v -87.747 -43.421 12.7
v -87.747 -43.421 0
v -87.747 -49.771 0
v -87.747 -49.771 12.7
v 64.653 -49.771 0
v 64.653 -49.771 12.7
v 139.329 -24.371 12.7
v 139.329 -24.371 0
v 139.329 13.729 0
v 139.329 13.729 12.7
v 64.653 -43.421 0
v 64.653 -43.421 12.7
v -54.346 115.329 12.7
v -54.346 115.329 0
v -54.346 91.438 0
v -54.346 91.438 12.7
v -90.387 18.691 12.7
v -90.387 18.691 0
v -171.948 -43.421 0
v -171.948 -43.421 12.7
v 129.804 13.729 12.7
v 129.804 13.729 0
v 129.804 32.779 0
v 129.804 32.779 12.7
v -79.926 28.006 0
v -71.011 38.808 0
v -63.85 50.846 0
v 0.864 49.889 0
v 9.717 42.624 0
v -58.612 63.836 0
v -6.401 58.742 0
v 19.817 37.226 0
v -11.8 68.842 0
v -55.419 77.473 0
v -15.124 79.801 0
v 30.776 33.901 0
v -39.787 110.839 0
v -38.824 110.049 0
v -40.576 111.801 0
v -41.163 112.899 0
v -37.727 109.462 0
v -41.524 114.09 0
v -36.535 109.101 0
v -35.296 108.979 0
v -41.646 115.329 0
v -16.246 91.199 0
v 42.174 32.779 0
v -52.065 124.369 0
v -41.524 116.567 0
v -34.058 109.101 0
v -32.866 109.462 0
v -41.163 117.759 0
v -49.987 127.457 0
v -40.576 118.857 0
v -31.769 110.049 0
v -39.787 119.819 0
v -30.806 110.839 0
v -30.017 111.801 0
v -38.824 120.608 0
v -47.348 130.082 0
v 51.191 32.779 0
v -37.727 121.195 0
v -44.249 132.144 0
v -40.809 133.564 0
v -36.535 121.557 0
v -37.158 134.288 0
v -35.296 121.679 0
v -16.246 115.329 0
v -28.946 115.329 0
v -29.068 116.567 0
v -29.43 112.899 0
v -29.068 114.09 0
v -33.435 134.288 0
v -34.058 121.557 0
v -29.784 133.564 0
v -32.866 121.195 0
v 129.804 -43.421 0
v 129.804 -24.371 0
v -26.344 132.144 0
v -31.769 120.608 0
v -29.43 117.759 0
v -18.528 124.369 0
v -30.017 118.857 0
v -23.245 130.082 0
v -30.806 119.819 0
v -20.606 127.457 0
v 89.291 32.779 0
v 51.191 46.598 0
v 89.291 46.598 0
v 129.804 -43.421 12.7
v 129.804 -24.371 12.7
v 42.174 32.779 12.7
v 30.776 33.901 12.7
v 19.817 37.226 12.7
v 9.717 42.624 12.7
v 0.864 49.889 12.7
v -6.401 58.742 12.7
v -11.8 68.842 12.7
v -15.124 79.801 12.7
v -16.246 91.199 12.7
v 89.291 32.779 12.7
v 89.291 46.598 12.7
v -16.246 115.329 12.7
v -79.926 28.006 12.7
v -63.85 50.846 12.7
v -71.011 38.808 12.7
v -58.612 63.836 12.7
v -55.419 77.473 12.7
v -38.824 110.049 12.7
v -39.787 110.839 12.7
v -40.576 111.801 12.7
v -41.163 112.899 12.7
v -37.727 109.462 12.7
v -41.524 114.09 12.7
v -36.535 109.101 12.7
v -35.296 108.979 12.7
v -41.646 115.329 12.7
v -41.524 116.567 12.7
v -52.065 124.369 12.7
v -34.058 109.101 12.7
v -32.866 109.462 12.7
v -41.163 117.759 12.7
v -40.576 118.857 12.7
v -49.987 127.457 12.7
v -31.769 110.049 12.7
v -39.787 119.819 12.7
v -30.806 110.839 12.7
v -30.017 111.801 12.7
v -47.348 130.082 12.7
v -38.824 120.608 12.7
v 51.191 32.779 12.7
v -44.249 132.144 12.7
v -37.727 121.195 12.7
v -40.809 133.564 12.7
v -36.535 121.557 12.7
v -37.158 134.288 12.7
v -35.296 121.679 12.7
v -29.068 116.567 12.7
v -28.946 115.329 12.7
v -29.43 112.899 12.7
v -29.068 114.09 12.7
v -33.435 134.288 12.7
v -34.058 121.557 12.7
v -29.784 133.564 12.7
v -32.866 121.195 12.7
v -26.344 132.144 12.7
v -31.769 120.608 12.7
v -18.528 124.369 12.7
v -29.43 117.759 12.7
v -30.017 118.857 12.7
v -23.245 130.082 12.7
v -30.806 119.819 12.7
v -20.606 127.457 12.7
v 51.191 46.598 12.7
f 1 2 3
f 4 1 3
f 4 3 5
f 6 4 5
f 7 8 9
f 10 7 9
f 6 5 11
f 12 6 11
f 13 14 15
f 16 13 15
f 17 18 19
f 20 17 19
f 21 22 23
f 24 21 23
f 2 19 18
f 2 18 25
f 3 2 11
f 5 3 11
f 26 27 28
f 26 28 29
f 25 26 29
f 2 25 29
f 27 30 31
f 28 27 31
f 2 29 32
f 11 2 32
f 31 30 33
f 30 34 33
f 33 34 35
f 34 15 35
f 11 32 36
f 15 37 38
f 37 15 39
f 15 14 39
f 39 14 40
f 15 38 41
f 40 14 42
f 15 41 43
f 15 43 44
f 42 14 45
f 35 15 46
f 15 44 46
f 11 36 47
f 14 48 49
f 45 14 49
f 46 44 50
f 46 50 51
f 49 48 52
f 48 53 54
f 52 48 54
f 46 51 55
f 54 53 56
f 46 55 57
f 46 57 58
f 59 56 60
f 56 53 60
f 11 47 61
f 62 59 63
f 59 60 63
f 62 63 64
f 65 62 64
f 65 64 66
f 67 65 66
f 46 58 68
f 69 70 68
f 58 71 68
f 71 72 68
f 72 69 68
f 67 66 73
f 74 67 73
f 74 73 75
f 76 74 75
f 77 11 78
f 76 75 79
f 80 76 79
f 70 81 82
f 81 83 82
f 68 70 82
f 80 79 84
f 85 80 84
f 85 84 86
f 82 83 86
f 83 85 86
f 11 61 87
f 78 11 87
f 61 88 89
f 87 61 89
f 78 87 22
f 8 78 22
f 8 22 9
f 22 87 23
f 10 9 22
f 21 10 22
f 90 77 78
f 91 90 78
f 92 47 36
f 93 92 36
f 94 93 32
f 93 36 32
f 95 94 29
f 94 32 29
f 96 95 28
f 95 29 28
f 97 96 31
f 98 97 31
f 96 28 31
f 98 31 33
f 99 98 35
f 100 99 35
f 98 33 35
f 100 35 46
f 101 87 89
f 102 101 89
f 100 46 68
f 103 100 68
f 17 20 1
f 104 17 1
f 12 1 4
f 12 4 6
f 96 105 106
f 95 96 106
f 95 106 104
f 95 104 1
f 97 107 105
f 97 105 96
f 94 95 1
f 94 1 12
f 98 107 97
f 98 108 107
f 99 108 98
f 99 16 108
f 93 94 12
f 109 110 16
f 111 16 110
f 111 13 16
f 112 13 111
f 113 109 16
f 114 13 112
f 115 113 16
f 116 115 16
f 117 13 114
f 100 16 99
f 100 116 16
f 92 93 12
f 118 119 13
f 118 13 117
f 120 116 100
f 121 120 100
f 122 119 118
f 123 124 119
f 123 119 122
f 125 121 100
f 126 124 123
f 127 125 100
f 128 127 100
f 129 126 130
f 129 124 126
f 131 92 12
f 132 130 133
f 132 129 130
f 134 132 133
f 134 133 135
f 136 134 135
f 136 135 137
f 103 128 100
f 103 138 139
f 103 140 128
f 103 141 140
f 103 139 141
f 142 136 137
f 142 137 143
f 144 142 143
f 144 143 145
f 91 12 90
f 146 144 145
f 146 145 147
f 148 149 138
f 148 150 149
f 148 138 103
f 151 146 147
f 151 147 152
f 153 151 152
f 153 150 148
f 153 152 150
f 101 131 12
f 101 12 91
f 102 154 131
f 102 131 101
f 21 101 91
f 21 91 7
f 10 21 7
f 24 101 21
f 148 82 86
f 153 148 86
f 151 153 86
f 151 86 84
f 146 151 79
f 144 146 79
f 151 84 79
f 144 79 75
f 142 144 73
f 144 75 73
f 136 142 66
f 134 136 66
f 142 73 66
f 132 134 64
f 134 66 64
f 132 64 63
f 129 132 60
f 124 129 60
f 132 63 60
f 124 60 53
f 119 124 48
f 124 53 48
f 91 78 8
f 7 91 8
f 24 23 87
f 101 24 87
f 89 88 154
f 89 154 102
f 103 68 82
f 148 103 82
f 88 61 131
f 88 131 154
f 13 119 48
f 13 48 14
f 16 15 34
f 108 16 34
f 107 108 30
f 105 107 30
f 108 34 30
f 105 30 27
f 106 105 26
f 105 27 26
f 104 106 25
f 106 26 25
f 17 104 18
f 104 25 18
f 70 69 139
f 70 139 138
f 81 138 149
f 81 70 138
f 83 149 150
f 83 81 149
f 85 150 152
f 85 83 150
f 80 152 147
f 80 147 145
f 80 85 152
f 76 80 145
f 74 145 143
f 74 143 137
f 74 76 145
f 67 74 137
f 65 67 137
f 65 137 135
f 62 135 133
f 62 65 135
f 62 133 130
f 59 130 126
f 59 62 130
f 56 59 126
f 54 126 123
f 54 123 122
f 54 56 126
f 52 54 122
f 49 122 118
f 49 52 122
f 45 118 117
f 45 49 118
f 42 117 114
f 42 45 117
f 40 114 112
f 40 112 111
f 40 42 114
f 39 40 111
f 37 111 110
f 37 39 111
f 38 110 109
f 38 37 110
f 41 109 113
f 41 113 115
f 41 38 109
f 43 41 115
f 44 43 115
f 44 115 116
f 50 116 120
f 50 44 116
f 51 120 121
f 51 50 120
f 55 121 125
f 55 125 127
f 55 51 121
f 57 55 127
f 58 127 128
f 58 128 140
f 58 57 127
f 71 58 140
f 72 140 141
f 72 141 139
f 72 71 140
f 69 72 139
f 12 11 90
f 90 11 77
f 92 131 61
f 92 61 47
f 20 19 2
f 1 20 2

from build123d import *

# Parameters (mm, degrees)
SKETCH1_R           = 6.35
SKETCH1_W           = 38.1
SKETCH1_H           = 13.818872092
BOSS_EXTRUDE1_DEPTH = 12.7


with BuildPart() as part:
    # Sketch1 → Boss-Extrude1 (new body)
    # profile 1 of 2: a face of its own
    with BuildSketch(Plane.XY):
        with BuildLine():
            Line((129.803523023, 13.72866743), (129.803523023, 32.77866743))
            Line((129.803523023, 32.77866743), (104.403523023, 32.77866743))
            Line((104.403523023, 32.77866743), (89.290523023, 32.77866743))
            Line((89.290523023, 32.77866743), (51.190523023, 32.77866743))
            Line((51.190523023, 32.77866743), (44.078523023, 32.77866743))
            Line((44.078523023, 32.77866743), (42.173523023, 32.77866743))
            ThreePointArc((42.173523023, 32.77866743), (0.864344867, 49.889489273), (-16.246476977, 91.19866743))
            Line((-16.246476977, 91.19866743), (-16.246476977, 115.32866743))
            Line((-16.246476977, 115.32866743), (-18.528129693, 124.368857105))
            ThreePointArc((-18.528129693, 124.368857105), (-35.296476977, 134.37866743), (-52.064824261, 124.368857105))
            Line((-52.064824261, 124.368857105), (-54.346476977, 115.32866743))
            Line((-54.346476977, 115.32866743), (-54.346476977, 91.438289009))
            ThreePointArc((-54.346476977, 91.438289009), (-63.850433524, 50.845698757), (-90.386686587, 18.691214671))
            Line((-90.386686587, 18.691214671), (-171.948476977, -43.42133257))
            Line((-171.948476977, -43.42133257), (-87.747476977, -43.42133257))
            Line((-87.747476977, -43.42133257), (-87.747476977, -49.77133257))
            Line((-87.747476977, -49.77133257), (-61.229320991, -49.77133257))
            Line((-61.229320991, -49.77133257), (-16.694588765, -49.77133257))
            Line((-16.694588765, -49.77133257), (64.652523023, -49.77133257))
            Line((64.652523023, -49.77133257), (64.652523023, -43.42133257))
            Line((64.652523023, -43.42133257), (129.803523023, -43.42133257))
            Line((129.803523023, -43.42133257), (129.803523023, -24.37133257))
            Line((129.803523023, -24.37133257), (139.328523023, -24.37133257))
            Line((139.328523023, -24.37133257), (139.328523023, 13.72866743))
            Line((139.328523023, 13.72866743), (129.803523023, 13.72866743))
        make_face()
        with Locations((-35.296476977, 115.32866743)):
            Circle(SKETCH1_R, mode=Mode.SUBTRACT)
    # profile 2 of 2: a face of its own
    with BuildSketch(Plane.XY):
        with Locations((70.240523023, 39.688103476)):
            Rectangle(SKETCH1_W, SKETCH1_H)
    extrude(amount=BOSS_EXTRUDE1_DEPTH)


solid = part.part
